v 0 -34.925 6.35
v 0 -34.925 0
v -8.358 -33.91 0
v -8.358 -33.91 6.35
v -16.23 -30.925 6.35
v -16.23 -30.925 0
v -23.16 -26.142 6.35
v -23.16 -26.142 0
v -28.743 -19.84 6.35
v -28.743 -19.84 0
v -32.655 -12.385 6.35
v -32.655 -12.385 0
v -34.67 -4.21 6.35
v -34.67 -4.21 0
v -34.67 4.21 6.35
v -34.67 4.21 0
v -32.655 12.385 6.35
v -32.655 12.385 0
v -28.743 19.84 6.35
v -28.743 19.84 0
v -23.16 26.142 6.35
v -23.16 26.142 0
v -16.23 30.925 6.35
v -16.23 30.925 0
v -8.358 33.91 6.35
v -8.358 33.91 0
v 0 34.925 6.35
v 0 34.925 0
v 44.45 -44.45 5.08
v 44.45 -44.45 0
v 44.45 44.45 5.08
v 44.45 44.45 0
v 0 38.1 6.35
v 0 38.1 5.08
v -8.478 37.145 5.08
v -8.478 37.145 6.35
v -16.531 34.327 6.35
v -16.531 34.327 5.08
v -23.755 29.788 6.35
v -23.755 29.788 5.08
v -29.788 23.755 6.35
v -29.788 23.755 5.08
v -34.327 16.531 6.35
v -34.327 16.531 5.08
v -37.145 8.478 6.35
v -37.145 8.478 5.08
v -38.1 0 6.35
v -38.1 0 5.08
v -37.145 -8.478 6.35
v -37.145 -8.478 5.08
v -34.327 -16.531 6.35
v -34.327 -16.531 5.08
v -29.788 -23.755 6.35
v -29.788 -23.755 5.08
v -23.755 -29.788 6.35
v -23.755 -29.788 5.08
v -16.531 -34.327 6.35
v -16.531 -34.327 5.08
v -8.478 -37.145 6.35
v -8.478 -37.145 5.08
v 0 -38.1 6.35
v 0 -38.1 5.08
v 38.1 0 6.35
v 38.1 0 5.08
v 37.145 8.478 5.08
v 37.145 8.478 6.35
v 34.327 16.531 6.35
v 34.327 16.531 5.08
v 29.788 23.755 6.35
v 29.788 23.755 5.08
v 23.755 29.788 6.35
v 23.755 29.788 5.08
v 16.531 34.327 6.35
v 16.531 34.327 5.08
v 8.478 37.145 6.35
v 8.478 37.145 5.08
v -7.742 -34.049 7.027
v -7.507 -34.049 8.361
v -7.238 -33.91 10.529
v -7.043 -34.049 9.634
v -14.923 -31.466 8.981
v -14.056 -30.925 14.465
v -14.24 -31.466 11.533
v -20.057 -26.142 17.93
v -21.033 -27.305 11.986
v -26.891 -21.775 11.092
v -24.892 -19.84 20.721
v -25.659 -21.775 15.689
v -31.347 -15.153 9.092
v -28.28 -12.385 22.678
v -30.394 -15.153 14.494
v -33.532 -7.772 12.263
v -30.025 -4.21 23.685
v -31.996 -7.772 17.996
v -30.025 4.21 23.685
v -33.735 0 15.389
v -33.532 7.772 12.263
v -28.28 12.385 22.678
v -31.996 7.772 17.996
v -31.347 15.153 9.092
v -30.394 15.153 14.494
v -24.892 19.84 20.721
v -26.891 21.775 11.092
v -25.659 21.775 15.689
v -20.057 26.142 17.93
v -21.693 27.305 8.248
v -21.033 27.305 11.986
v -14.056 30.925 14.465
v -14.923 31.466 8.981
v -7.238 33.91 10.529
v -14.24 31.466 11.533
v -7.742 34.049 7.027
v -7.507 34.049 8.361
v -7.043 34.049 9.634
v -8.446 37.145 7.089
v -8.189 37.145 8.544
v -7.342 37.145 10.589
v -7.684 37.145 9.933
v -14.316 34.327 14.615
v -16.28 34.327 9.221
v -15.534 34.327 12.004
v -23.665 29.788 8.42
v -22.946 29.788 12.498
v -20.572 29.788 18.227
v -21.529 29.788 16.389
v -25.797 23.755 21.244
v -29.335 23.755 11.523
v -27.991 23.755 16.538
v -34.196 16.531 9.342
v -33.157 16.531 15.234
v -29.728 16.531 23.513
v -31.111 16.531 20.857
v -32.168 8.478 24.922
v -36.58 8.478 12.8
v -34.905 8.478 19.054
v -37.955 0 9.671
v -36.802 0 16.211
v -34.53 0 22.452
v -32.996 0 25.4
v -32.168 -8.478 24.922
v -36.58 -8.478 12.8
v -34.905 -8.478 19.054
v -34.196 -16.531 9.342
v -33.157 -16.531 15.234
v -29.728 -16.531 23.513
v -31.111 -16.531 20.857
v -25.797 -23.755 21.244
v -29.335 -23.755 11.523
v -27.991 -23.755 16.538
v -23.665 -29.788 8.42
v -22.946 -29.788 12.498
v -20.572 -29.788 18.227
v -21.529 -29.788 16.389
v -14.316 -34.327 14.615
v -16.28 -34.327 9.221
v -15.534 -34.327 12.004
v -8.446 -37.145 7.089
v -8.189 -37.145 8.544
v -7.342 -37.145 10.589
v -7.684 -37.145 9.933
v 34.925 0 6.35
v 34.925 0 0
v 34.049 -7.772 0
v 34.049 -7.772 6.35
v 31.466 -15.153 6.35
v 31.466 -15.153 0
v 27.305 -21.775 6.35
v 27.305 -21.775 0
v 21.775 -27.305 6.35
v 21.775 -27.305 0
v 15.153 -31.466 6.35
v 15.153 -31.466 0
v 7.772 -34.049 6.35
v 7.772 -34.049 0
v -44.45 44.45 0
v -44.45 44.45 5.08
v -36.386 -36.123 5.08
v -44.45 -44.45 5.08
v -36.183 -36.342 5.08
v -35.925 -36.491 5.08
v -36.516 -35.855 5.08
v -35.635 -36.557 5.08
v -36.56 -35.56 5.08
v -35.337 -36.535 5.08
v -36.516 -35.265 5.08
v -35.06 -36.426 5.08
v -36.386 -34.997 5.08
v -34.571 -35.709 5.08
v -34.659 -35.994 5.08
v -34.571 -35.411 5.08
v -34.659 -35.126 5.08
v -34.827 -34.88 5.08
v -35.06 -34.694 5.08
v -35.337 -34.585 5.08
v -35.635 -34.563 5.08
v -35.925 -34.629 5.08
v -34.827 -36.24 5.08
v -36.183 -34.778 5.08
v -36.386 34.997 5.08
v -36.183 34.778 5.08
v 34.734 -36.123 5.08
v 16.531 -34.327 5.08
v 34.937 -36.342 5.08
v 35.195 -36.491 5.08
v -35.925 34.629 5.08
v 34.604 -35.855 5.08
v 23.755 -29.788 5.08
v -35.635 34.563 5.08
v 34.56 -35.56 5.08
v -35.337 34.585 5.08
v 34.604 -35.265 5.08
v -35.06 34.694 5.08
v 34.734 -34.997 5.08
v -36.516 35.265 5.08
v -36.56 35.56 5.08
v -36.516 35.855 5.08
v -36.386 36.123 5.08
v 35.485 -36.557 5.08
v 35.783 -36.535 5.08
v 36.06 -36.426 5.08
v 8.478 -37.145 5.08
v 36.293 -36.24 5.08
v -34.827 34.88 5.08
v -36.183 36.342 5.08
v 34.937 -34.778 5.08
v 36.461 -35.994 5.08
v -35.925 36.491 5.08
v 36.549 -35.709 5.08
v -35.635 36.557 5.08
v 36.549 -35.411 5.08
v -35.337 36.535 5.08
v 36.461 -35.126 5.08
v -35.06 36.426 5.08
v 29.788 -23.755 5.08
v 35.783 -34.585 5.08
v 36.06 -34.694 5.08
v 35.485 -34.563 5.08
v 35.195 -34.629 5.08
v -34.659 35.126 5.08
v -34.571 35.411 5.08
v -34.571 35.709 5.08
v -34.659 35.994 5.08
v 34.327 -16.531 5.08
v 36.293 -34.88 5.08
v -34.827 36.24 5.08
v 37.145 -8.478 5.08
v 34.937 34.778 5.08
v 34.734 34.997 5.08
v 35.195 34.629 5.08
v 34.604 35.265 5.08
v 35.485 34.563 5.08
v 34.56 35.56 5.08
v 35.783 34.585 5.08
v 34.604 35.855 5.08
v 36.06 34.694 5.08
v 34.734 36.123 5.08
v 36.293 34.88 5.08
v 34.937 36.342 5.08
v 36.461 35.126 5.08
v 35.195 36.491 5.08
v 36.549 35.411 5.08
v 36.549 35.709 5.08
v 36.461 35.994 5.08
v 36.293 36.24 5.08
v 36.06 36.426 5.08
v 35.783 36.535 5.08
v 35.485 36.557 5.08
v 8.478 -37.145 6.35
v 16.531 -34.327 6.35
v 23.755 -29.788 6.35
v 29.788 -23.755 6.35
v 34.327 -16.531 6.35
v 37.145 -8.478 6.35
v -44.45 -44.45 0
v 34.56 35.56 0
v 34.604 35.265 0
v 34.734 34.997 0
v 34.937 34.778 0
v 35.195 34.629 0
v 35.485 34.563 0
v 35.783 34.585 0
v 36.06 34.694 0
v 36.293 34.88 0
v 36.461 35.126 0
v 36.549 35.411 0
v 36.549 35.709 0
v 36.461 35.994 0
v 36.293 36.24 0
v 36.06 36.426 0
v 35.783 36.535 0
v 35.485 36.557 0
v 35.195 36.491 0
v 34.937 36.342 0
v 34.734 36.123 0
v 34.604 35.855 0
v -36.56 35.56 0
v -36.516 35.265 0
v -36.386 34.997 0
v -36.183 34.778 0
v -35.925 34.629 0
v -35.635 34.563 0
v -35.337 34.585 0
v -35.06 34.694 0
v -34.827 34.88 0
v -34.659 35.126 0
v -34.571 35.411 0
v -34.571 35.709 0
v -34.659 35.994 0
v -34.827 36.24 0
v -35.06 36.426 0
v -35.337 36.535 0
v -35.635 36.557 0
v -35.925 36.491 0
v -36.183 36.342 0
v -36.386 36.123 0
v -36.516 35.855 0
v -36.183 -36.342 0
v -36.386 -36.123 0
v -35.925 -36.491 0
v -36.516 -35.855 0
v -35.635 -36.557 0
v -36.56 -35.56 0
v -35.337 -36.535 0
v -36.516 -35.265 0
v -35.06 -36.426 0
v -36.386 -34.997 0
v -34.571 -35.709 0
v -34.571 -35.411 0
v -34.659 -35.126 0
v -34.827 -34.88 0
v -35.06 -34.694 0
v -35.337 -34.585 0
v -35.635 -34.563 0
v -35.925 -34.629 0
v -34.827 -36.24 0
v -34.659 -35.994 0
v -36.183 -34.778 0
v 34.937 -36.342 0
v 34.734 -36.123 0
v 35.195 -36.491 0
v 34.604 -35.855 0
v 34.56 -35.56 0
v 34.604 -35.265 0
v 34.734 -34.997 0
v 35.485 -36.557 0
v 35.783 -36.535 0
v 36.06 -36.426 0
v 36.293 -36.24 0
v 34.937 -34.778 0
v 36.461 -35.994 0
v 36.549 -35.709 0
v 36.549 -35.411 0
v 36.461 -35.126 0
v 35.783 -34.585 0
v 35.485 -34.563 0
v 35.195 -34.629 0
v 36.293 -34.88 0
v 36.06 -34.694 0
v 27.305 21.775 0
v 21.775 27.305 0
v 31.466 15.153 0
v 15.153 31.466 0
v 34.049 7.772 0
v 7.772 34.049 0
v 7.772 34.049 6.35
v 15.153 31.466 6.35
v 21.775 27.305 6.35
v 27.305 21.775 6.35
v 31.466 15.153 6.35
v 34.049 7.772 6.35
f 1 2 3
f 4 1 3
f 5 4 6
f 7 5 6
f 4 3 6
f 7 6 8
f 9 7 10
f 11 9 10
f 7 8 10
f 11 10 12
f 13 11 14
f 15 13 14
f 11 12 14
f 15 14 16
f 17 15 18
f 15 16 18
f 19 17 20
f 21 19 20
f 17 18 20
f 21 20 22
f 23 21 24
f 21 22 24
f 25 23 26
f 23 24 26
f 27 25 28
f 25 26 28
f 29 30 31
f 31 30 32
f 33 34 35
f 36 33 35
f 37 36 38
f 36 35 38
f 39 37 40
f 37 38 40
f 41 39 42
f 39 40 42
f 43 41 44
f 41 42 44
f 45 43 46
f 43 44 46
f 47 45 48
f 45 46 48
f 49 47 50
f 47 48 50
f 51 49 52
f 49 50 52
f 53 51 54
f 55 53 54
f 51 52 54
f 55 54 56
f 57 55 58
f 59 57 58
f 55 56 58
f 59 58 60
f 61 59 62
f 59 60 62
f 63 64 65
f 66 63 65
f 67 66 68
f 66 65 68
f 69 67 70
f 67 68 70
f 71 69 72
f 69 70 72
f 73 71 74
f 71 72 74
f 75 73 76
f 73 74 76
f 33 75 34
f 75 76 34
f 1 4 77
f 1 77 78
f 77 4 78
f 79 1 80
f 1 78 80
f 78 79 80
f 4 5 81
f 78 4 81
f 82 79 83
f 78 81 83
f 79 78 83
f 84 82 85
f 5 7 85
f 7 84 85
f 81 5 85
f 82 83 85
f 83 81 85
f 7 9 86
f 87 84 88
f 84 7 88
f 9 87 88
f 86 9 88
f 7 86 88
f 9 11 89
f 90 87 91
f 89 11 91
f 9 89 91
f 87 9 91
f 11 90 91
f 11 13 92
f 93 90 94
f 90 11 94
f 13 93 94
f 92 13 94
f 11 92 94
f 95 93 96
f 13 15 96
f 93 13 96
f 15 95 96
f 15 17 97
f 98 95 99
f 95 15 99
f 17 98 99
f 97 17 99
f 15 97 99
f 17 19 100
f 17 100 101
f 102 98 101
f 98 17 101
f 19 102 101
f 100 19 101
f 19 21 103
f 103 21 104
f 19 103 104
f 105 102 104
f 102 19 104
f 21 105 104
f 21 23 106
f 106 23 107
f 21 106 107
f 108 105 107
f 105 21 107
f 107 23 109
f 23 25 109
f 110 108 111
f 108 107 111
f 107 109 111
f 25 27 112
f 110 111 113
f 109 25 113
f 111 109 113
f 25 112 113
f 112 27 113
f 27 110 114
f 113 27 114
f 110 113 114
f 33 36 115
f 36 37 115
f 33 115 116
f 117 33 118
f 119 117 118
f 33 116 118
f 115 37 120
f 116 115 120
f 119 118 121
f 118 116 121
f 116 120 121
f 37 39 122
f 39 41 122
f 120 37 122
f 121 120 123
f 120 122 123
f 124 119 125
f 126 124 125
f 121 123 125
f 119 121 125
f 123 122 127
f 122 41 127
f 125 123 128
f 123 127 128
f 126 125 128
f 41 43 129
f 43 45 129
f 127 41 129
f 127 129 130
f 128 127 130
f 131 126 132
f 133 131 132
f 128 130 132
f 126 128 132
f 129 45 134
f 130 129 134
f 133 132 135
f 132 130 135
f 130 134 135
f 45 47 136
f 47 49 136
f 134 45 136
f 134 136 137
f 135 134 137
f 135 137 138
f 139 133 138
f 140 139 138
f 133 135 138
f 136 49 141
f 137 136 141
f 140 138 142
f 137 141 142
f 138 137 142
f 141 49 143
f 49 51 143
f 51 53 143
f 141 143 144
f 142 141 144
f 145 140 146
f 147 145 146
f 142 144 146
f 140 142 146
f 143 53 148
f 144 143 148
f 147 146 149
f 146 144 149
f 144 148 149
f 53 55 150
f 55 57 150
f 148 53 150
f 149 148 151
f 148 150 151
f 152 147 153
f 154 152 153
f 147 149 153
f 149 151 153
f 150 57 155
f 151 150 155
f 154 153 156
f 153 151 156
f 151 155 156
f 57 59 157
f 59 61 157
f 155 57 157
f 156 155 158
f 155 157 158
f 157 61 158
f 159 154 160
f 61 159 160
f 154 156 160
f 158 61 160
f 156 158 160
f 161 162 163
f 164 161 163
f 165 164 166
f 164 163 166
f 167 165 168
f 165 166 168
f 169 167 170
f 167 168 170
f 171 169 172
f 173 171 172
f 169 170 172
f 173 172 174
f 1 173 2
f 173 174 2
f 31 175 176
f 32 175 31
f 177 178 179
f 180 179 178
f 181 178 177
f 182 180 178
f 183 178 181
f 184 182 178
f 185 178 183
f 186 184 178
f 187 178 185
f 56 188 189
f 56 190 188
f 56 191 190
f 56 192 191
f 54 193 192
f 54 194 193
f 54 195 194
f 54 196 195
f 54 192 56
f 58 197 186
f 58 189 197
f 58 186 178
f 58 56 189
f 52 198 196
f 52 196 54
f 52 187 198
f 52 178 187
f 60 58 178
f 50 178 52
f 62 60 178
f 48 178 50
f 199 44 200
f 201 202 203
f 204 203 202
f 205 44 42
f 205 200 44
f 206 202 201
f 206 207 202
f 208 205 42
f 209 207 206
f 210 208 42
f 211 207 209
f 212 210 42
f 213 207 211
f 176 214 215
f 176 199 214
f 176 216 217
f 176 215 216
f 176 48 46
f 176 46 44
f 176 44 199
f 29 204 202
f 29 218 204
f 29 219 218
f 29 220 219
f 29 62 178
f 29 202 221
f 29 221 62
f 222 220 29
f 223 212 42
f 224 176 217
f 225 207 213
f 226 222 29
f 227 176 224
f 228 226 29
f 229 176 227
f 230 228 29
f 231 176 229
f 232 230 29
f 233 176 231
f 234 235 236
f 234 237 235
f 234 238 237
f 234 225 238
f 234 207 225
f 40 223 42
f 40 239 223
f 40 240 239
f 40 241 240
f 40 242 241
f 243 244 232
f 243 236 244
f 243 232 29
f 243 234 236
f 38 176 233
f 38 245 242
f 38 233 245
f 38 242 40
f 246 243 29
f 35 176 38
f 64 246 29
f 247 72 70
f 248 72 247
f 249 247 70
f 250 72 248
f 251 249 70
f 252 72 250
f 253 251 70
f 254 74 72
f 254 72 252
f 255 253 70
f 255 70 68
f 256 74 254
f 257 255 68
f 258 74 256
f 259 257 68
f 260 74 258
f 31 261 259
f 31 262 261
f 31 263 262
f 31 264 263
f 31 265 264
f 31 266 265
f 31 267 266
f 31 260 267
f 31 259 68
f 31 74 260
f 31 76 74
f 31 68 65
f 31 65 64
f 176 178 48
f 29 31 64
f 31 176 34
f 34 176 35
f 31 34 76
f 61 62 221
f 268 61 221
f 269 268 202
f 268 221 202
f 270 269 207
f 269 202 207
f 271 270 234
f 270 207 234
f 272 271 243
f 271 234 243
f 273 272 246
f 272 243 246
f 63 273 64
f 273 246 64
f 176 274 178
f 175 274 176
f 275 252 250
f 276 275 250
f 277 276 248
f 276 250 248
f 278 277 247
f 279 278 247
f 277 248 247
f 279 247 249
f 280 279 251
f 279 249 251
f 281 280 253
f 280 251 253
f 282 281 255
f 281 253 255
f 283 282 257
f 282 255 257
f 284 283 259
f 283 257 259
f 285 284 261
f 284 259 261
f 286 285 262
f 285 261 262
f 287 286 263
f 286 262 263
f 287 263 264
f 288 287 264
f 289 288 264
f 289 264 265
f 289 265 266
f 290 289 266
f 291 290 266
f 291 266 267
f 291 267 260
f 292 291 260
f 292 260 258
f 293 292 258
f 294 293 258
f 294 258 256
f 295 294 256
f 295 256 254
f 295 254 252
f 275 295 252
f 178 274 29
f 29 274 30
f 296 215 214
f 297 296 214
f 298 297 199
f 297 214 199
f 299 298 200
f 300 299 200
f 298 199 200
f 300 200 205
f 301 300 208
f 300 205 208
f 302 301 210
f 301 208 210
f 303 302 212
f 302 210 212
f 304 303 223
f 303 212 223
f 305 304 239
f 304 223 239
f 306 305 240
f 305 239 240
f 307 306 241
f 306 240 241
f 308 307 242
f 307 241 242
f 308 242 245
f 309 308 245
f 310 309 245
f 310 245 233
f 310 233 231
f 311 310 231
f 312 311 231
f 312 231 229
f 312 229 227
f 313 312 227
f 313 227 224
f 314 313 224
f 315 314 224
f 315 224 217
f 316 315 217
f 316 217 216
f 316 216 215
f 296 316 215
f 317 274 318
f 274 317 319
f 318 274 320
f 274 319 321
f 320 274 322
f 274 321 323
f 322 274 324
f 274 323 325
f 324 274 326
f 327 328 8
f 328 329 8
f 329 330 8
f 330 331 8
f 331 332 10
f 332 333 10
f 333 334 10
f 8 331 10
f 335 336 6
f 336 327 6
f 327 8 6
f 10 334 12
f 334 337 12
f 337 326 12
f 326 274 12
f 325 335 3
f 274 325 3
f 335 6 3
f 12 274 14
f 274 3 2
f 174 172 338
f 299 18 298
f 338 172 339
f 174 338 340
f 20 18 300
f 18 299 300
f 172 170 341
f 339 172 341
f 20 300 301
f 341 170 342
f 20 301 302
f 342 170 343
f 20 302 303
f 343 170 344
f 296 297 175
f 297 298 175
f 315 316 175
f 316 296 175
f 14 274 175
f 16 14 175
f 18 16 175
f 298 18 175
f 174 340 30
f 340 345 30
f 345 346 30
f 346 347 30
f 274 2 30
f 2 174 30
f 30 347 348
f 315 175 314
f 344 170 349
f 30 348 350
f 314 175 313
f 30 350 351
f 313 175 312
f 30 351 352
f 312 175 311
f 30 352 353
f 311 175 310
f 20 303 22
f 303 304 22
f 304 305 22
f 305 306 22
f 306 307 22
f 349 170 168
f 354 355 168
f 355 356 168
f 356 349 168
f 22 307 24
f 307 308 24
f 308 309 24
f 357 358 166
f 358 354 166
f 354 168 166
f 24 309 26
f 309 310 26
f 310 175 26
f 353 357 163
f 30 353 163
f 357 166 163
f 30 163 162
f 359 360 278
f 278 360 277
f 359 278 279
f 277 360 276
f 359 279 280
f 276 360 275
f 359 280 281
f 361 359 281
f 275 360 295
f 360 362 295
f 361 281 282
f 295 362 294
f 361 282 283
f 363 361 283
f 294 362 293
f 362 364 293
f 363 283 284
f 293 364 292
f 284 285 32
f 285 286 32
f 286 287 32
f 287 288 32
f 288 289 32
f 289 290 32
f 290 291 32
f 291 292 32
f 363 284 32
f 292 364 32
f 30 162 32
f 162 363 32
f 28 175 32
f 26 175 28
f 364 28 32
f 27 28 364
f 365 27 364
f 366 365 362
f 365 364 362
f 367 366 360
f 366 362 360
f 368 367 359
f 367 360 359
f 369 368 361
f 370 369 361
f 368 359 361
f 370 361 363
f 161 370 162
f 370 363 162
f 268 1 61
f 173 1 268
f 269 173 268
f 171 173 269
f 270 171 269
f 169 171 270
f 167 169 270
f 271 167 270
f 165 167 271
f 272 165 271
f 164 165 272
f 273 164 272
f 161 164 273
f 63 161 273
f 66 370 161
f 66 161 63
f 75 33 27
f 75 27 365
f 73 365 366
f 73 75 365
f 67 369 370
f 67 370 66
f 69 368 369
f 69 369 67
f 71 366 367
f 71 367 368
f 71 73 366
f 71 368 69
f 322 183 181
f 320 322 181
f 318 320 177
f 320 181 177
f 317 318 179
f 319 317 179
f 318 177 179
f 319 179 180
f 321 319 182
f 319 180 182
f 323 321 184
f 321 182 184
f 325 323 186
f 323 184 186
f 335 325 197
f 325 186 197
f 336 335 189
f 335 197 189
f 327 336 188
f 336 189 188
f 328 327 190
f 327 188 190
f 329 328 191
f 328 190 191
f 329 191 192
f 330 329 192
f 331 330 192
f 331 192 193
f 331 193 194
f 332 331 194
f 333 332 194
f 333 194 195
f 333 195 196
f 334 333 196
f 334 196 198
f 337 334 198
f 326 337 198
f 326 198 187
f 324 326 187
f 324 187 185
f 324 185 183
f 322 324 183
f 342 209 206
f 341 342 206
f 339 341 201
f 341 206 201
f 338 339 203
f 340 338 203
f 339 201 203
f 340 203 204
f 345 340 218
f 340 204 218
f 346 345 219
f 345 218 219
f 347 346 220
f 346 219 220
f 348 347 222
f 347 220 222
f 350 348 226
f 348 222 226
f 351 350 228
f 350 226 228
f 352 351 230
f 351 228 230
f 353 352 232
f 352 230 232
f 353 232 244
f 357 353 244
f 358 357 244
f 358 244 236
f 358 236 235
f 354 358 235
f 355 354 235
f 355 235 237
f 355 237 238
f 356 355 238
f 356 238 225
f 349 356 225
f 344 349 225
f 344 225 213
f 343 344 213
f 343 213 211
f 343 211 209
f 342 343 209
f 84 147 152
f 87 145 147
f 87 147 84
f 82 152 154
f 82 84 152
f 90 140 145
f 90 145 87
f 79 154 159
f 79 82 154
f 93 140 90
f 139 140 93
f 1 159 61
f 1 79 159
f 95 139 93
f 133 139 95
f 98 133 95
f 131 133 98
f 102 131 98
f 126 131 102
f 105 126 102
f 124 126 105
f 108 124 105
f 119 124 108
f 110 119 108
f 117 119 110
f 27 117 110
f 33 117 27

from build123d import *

# Parameters (mm, degrees)
F0_W     = 88.9
F0_H     = 88.9
F1_DEPTH = 5.08
F2_DEPTH = 6.35
F3_DEPTH = 6.35
F5_ANGLE = -30
F6_D     = 2


with BuildPart() as f1:
    # F0 (on Top) → F1 (new body)
    with BuildSketch(Plane.XY):
        Rectangle(F0_W, F0_H)
        with BuildLine():
            ThreePointArc((0, 38.1), (26.940768, 26.940768), (38.1, 0))
            ThreePointArc((38.1, 0), (26.940768, -26.940768), (0, -38.1))
            ThreePointArc((0, -38.1), (-38.1, 0), (0, 38.1))
        make_face(mode=Mode.SUBTRACT)
    extrude(amount=F1_DEPTH)

    # F0 (on Top) → F2 (join)
    with BuildSketch(Plane.XY):
        with BuildLine():
            Line((0, 34.925), (0, 38.1))
            ThreePointArc((0, 38.1), (-38.1, 0), (0, -38.1))
            Line((0, -38.1), (0, -34.925))
            ThreePointArc((0, -34.925), (-34.925, 0), (0, 34.925))
        make_face()
    extrude(amount=F2_DEPTH)

    # F0 (on Top) → F3 (join)
    with BuildSketch(Plane.XY):
        with BuildLine():
            ThreePointArc((0, -38.1), (26.940768, -26.940768), (38.1, 0))
            ThreePointArc((38.1, 0), (26.940768, 26.940768), (0, 38.1))
            Line((0, 38.1), (0, 34.925))
            ThreePointArc((0, 34.925), (24.695704, 24.695704), (34.925, 0))
            ThreePointArc((34.925, 0), (24.695704, -24.695704), (0, -34.925))
            Line((0, -34.925), (0, -38.1))
        make_face()
    extrude(amount=F3_DEPTH)

    # F4 (on face) → F5 (revolve)
    with BuildSketch(Plane.XY.offset(6.35)):
        with BuildLine():
            Line((0, -38.1), (0, -34.925))
            ThreePointArc((0, -34.925), (-34.925, 0), (0, 34.925))
            Line((0, 34.925), (0, 38.1))
            ThreePointArc((0, 38.1), (-38.1, 0), (0, -38.1))
        make_face()
    revolve(axis=Axis((0, -36.5125, 6.35), (0, -1, 0)), revolution_arc=F5_ANGLE)

    # F6 (through all)
    with Locations(Plane(origin=(0, 0, 0), x_dir=(1, 0, 0), z_dir=(0, 0, -1))):
        with Locations((35.56, 35.56), (35.56, -35.56), (-35.56, -35.56), (-35.56, 35.56)):
            Hole(F6_D / 2)


solid = f1.part
